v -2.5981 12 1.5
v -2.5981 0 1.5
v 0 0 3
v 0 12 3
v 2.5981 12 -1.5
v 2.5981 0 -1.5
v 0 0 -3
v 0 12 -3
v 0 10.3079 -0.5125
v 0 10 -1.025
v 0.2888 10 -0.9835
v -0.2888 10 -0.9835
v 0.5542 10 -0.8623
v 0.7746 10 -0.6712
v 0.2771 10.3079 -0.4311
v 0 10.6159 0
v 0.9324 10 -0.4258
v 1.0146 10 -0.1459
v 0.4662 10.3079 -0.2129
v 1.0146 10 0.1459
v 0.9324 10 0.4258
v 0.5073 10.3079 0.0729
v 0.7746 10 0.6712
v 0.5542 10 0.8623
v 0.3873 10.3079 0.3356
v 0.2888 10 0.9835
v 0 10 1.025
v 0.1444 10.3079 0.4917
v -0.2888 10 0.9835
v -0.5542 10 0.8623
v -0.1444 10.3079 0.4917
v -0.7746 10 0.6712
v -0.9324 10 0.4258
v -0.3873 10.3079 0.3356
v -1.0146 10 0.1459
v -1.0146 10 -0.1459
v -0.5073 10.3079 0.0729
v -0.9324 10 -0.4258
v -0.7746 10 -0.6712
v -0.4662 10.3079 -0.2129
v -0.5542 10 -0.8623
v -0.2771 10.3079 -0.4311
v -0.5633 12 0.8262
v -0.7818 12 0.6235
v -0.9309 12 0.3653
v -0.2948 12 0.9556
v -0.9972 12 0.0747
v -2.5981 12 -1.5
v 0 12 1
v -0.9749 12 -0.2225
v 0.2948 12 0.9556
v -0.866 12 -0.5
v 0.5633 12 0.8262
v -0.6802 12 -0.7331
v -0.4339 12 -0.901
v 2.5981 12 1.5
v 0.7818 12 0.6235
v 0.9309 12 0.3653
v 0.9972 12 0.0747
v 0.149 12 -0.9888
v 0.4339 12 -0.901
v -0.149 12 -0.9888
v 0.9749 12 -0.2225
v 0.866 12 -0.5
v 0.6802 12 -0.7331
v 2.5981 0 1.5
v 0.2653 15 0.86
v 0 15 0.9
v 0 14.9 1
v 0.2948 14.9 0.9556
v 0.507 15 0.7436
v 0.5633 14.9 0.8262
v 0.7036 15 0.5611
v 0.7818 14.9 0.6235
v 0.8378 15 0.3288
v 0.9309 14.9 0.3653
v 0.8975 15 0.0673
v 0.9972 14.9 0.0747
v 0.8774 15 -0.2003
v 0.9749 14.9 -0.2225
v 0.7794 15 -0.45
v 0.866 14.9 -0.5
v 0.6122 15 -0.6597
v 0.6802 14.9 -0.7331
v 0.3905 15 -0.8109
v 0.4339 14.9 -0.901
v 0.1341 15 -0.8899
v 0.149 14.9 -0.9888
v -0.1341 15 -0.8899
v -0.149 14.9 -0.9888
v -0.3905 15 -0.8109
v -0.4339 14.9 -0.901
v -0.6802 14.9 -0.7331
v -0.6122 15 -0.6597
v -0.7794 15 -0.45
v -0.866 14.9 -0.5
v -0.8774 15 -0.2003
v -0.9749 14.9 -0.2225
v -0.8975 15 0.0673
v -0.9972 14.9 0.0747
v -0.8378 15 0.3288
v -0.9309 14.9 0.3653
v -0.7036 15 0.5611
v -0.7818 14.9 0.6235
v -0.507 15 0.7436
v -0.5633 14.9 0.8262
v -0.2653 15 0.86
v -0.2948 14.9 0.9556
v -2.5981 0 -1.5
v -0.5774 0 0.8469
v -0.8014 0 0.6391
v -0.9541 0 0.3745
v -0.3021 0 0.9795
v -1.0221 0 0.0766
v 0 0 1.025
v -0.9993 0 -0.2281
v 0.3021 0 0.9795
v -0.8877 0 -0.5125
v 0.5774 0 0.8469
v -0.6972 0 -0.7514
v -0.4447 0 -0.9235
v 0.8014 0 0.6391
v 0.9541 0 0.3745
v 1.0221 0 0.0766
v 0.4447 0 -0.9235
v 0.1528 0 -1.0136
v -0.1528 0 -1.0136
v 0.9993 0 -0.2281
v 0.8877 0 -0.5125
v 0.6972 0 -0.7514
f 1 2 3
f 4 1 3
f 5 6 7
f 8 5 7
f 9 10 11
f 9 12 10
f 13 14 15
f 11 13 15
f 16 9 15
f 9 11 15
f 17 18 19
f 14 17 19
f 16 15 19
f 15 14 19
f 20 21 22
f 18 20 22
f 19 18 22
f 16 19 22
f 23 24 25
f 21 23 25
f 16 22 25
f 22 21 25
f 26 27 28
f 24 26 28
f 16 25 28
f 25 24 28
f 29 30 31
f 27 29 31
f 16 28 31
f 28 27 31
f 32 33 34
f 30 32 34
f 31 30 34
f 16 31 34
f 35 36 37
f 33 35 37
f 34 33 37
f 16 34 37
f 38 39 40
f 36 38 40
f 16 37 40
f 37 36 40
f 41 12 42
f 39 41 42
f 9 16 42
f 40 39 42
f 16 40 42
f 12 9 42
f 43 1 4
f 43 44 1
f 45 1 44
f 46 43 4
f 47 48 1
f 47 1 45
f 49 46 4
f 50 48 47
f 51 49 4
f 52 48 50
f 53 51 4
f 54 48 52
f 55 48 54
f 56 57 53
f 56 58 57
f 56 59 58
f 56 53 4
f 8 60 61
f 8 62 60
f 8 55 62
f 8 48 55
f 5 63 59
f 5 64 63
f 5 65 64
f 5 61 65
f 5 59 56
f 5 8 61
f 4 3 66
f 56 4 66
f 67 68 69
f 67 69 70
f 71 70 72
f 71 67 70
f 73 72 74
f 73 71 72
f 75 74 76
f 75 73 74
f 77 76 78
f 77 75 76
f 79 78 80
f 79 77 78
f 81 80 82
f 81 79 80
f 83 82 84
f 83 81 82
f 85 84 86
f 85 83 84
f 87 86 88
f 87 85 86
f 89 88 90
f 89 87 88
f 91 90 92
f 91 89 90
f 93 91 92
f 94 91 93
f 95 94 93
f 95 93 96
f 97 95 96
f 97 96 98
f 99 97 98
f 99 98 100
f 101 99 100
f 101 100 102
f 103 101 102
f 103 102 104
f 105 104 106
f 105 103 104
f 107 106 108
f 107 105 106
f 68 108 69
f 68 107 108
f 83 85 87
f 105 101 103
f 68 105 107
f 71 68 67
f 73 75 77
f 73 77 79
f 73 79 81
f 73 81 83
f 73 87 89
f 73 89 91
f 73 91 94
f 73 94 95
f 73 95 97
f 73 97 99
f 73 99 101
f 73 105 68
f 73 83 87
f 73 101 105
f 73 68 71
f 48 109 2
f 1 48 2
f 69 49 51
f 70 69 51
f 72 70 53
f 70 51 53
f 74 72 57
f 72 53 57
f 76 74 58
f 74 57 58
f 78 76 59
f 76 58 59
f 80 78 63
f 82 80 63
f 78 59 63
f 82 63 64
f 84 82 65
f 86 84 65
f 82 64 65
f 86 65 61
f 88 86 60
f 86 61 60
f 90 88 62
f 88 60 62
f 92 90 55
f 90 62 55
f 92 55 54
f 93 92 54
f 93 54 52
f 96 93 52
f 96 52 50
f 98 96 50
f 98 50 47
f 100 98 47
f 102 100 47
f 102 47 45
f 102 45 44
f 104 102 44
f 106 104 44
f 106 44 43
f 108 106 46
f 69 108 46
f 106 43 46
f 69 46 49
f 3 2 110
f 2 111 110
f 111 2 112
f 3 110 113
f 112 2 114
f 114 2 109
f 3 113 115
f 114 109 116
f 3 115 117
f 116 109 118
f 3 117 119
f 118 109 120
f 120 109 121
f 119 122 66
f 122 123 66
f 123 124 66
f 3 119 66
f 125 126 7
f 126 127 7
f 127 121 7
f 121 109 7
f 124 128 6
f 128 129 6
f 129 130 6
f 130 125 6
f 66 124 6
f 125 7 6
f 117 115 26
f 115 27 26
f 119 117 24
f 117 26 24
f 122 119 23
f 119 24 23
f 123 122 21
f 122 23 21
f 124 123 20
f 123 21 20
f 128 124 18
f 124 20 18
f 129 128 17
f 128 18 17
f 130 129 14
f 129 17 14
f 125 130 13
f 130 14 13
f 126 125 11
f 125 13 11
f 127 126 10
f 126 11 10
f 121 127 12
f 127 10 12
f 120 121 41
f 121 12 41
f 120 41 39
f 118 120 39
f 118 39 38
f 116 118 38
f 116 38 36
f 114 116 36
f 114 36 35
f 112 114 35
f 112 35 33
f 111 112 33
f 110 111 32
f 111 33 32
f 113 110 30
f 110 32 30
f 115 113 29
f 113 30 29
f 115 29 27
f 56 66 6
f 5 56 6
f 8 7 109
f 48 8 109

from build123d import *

# Parameters (mm, degrees)
EXTRUDE_1_DEPTH  = 12
SKETCH_2_R       = 1
EXTRUDE_2_DEPTH  = 3
M2_5X0_451_D     = 2.05
M2_5X0_451_DEPTH = 10
M2_5X0_451_TIP   = 0.615882135
CHAMFER_1_SIZE   = 0.1


with BuildPart() as part:
    # Эскиз1 → Бобышка-Вытянуть1 (new body)
    with BuildSketch(Plane(origin=(0, 0, 0), x_dir=(1, 0, 0), z_dir=(0, 1, 0))):
        Polygon((0, 3), (-2.598076211, 1.5), (-2.598076211, -1.5), (0, -3), (2.598076211, -1.5), (2.598076211, 1.5), align=None)
    extrude(amount=EXTRUDE_1_DEPTH)

    # Эскиз2 → Бобышка-Вытянуть2 (add)
    with BuildSketch(Plane(origin=(0, 12, 0), x_dir=(1, 0, 0), z_dir=(0, 1, 0))):
        with Locations(Location((0, 0, 0), (0, 0, 270))):
            Circle(SKETCH_2_R)
    extrude(amount=EXTRUDE_2_DEPTH)

    # Отверстие обработанное метчиком M2.5x0.451
    with Locations(Plane(origin=(0, 0, 0), x_dir=(0, 0, -1), z_dir=(0, -1, 0))):
        with Locations((0, 0)):
            Hole(M2_5X0_451_D / 2, depth=M2_5X0_451_DEPTH)
            with Locations((0, 0, -(M2_5X0_451_DEPTH + M2_5X0_451_TIP / 2))):  # 118° drill point
                Cone(0, M2_5X0_451_D / 2, M2_5X0_451_TIP, mode=Mode.SUBTRACT)

    # Фаска1
    chamfer_1_edges = [part.edges().sort_by_distance(p)[0] for p in [
        (0, 15, -1),
    ]]
    chamfer(chamfer_1_edges, length=CHAMFER_1_SIZE)


solid = part.part
